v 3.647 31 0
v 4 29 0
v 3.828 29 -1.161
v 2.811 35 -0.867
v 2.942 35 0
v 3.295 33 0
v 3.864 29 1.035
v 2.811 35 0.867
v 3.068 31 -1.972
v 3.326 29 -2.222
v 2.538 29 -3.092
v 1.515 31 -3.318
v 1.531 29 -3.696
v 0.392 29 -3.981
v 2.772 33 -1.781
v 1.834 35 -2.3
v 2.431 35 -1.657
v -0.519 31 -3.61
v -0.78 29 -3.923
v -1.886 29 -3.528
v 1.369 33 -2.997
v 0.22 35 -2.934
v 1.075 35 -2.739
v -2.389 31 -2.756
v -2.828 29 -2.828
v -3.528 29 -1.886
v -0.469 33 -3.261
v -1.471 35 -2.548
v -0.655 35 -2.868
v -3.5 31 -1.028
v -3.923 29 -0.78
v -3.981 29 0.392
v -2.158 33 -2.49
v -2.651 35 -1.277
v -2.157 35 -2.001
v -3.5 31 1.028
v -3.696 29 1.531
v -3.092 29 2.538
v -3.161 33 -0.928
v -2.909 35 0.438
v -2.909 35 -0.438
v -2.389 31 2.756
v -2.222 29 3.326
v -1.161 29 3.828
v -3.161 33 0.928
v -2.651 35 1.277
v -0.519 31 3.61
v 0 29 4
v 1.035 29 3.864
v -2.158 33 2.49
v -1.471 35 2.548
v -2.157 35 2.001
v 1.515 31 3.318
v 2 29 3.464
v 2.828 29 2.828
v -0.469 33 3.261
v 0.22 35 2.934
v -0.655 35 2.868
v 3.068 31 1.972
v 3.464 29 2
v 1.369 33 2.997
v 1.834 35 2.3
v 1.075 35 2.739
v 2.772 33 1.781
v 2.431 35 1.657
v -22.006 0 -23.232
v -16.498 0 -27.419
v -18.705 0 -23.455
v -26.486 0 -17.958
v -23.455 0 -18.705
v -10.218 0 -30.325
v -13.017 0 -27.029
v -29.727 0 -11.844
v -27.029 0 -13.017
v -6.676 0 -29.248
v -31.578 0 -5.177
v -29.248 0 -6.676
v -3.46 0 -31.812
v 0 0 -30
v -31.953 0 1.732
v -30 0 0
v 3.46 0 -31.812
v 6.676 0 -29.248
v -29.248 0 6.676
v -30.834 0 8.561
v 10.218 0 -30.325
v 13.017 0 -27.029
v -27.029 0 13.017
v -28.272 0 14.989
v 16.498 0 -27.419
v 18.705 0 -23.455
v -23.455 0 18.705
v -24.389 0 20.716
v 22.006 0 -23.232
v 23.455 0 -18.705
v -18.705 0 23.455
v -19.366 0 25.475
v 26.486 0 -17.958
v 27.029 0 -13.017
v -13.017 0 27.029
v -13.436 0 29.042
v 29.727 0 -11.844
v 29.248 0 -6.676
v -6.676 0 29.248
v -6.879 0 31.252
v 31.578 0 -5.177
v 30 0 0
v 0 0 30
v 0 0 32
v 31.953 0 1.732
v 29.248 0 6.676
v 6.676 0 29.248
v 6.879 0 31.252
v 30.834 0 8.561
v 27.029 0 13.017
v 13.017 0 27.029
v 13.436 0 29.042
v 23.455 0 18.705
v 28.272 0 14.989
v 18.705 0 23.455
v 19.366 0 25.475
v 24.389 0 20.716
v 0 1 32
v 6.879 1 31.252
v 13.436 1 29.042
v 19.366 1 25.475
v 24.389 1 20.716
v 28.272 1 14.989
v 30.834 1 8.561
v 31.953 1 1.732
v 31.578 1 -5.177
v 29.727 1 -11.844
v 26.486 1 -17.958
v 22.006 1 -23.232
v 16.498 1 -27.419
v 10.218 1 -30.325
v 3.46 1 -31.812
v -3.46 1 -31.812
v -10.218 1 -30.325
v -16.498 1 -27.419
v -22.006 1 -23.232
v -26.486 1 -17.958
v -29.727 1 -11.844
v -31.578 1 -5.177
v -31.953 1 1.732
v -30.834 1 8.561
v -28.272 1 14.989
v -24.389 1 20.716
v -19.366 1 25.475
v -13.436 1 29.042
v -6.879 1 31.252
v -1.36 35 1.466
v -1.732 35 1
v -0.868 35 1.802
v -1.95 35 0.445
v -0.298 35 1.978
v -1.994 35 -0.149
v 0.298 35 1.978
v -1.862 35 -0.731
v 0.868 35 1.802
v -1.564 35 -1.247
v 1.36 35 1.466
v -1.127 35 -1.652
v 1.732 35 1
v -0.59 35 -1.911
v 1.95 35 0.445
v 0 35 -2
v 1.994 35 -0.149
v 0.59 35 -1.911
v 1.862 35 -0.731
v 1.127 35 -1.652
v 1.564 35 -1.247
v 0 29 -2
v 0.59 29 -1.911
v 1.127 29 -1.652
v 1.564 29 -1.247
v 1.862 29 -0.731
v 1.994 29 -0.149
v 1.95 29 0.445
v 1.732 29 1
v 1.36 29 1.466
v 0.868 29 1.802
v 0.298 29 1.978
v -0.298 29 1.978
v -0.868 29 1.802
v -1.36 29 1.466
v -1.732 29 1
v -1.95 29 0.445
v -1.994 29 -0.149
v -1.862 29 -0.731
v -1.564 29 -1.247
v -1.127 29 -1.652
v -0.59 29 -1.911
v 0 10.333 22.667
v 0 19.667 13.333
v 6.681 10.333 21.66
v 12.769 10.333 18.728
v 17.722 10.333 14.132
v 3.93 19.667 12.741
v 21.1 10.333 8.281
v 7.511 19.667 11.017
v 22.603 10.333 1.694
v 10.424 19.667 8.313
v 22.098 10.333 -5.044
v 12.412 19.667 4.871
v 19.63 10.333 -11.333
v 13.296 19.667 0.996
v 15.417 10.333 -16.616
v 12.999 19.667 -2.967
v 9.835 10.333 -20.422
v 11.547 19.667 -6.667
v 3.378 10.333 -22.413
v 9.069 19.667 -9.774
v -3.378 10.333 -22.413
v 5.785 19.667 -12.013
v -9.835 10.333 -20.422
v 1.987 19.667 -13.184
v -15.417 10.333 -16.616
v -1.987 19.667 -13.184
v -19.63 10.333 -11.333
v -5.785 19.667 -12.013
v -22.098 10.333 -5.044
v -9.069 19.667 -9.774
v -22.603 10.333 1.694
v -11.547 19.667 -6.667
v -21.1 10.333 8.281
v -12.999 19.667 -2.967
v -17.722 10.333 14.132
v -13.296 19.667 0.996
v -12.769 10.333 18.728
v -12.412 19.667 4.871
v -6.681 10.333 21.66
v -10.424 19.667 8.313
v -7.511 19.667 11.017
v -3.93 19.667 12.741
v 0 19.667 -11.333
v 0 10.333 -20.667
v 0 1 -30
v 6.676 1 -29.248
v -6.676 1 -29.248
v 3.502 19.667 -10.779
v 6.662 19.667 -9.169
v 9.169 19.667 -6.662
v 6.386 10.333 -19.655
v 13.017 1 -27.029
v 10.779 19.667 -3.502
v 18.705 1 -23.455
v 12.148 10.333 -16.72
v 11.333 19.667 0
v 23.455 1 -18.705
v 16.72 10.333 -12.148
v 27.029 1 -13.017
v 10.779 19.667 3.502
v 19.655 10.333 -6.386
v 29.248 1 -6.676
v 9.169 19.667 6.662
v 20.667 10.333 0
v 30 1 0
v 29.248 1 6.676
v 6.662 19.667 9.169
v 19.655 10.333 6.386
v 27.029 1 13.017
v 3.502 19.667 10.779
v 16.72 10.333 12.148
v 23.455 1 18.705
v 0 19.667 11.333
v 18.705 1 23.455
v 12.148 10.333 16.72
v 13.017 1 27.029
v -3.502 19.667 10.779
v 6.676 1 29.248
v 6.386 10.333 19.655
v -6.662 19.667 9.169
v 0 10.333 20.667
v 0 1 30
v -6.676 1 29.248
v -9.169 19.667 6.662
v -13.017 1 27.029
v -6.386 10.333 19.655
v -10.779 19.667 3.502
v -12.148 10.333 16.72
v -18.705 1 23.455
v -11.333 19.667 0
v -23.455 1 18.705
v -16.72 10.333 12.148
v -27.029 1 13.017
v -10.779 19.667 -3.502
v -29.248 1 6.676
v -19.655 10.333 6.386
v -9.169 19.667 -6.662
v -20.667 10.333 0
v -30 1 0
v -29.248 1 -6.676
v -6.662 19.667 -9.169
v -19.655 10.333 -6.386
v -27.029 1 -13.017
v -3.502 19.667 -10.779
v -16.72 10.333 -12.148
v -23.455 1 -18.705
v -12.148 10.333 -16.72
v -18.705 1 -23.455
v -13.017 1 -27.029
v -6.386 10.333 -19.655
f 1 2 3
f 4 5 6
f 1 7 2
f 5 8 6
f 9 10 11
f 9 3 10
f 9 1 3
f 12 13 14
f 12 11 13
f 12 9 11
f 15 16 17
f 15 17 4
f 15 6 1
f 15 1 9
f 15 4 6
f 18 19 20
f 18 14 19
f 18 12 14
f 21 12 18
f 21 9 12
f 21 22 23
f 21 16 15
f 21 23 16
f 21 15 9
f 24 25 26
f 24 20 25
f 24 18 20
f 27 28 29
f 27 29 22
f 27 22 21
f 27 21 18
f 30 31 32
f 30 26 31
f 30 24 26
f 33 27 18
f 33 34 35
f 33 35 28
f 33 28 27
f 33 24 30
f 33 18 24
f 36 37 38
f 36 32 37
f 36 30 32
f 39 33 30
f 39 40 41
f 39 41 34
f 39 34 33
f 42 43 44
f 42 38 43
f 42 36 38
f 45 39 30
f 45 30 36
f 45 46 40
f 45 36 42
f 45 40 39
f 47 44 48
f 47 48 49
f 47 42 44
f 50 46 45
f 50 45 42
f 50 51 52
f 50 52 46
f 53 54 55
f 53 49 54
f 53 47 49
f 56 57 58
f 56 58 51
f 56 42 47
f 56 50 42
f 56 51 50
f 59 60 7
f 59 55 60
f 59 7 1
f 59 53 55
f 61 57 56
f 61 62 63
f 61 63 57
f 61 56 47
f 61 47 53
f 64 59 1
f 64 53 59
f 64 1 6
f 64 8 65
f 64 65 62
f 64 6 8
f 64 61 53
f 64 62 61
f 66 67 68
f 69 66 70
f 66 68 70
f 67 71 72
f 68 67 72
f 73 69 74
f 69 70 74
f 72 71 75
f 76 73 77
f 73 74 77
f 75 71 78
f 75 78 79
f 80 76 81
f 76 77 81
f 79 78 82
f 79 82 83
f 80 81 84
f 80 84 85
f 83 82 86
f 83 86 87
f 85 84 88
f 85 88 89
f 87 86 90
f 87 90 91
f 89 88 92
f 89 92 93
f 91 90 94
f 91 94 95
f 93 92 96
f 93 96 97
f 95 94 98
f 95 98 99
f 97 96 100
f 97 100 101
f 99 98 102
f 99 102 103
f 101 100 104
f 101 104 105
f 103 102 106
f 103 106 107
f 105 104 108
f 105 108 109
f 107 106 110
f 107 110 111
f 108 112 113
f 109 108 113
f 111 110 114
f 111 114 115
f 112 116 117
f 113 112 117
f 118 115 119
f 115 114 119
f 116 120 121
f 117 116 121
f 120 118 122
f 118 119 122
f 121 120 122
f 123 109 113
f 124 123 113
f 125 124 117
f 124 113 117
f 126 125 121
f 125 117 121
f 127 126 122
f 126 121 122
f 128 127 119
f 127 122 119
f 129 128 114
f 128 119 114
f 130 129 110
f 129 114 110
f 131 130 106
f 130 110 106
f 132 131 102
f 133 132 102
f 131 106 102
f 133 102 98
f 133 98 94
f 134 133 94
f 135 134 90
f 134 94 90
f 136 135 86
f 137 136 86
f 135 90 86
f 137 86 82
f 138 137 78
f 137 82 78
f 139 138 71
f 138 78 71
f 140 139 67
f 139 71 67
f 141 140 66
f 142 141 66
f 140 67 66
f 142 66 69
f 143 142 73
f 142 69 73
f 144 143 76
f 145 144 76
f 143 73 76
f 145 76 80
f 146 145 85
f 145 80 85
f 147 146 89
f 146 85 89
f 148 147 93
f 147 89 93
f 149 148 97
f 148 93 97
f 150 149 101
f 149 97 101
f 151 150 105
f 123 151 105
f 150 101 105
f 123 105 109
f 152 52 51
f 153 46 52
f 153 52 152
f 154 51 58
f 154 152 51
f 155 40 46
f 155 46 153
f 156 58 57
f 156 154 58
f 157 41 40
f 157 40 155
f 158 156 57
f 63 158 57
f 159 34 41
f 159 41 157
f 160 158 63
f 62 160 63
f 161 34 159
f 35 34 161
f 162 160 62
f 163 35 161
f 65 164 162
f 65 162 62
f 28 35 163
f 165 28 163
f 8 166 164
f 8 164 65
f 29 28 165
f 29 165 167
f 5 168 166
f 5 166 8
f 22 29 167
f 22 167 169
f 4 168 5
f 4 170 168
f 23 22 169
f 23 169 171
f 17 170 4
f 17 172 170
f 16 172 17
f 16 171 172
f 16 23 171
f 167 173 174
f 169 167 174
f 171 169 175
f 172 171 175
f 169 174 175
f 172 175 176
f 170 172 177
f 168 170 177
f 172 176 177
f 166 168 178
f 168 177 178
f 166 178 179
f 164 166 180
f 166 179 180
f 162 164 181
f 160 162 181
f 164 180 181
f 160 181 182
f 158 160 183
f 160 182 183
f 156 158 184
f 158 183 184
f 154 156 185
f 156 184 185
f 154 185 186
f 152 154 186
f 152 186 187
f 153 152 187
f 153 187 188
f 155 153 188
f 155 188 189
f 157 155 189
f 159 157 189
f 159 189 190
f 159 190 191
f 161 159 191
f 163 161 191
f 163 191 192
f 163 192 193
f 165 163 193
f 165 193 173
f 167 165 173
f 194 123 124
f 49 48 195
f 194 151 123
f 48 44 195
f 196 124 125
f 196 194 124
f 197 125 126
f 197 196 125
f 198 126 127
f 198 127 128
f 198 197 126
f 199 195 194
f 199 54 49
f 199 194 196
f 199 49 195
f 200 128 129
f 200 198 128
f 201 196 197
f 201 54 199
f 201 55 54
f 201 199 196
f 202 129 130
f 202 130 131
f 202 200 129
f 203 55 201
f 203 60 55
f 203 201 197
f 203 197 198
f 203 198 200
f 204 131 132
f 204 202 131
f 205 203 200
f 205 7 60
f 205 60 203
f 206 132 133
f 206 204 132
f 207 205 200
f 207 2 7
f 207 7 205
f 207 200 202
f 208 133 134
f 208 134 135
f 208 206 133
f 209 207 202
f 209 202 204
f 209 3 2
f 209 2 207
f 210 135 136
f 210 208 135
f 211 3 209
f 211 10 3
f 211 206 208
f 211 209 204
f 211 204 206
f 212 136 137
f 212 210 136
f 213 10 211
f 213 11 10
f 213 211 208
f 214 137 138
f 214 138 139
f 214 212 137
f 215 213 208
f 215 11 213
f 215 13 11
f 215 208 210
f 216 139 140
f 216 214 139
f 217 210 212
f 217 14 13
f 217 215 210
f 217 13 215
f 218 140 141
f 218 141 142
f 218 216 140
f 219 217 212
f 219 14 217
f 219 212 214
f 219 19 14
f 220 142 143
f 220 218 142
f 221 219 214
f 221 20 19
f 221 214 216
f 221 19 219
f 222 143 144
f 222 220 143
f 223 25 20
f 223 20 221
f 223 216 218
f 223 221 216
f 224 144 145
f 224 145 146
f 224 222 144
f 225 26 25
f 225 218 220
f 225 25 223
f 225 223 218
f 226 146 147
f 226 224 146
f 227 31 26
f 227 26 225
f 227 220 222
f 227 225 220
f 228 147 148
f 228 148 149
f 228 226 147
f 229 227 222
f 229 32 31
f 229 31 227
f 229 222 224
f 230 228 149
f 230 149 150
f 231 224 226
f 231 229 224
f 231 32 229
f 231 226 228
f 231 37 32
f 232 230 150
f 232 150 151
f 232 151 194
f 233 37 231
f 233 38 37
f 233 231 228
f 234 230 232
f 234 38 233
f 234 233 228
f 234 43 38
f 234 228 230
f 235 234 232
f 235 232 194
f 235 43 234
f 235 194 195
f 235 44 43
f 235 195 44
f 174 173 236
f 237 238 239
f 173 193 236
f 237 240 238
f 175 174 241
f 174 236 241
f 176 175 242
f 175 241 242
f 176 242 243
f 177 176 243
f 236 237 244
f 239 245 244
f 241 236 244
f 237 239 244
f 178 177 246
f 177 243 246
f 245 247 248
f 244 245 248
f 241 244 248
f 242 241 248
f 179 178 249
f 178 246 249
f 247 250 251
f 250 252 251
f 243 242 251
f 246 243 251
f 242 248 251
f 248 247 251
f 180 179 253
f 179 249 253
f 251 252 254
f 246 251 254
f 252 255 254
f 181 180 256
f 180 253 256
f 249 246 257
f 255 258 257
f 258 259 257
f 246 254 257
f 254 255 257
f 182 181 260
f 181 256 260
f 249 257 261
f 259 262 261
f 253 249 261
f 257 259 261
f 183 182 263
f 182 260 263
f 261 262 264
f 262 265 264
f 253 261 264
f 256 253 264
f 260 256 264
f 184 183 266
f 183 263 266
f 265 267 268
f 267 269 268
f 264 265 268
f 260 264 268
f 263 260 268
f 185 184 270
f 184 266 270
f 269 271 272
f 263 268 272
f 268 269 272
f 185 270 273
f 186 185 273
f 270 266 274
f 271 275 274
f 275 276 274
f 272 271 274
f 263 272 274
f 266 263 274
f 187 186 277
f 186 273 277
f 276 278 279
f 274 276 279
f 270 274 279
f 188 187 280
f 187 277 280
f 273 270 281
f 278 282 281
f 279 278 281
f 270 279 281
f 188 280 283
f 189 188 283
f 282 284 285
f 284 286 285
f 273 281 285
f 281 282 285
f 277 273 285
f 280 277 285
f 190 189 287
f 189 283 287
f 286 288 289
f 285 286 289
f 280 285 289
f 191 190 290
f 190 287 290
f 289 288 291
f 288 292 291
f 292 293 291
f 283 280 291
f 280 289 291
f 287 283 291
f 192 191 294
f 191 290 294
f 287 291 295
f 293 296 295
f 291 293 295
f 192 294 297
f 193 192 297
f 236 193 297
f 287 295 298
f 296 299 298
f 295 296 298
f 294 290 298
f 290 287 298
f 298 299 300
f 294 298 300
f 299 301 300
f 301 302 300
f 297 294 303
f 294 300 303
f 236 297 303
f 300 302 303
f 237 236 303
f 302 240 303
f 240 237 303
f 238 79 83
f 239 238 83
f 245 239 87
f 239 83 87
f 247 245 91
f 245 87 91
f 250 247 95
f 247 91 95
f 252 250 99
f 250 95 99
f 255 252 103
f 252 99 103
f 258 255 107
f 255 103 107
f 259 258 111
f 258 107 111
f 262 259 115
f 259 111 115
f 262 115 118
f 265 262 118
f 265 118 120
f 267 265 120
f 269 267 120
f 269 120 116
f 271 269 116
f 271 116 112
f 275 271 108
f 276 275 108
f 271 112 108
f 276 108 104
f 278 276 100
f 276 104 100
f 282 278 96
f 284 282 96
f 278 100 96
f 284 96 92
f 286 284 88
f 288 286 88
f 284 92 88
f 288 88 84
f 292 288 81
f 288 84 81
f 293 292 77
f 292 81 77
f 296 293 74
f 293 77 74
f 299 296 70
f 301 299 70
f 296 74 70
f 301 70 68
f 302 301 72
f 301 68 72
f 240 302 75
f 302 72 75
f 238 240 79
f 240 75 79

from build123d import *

# Parameters (mm, degrees)
SKETCH_2_R          = 32
EXTRUDE_2_DEPTH     = 1
SKETCH_3_R          = 32
EXTRUDE_3_DEPTH     = 28
EXTRUDE_3_TAPER     = 45
SKETCH_5_R          = 30
CUT_EXTRUDE_1_DEPTH = 1
SKETCH_6_R          = 30
CUT_EXTRUDE_2_DEPTH = 28
CUT_EXTRUDE_2_DRAFT = -45
SKETCH_7_R          = 4
EXTRUDE_5_DEPTH     = 6
EXTRUDE_5_TAPER     = 10
SKETCH_10_R         = 2
CUT_EXTRUDE_3_DEPTH = 54.749418721


with BuildPart() as part:
    # 草图2 → 凸台-拉伸2 (new body)
    with BuildSketch(Plane(origin=(0, 0, 0), x_dir=(1, 0, 0), z_dir=(0, 1, 0))):
        with Locations(Location((0, 0, 0), (0, 0, 270))):
            Circle(SKETCH_2_R)
    extrude(amount=EXTRUDE_2_DEPTH)

    # 草图3 → 凸台-拉伸3 (add)
    with BuildSketch(Plane(origin=(0, 1, 0), x_dir=(1, 0, 0), z_dir=(0, 1, 0))):
        with Locations(Location((0, 0, 0), (0, 0, 270))):
            Circle(SKETCH_3_R)
    extrude(amount=EXTRUDE_3_DEPTH, taper=EXTRUDE_3_TAPER)

    # 草图5 → 切除-拉伸1 (cut)
    with BuildSketch(Plane(origin=(0, 0, 0), x_dir=(-1, 0, 0), z_dir=(0, -1, 0))):
        with Locations(Location((0, 0, 0), (0, 0, 90))):
            Circle(SKETCH_5_R)
    extrude(amount=-CUT_EXTRUDE_1_DEPTH, mode=Mode.SUBTRACT)


with BuildPart() as cut_extrude_2_tool:
    # 草图6 → 切除-拉伸2 (with draft: the straight prism first)
    with BuildSketch(Plane(origin=(0, 1, 0), x_dir=(-1, 0, 0), z_dir=(0, -1, 0))):
        with Locations(Location((0, 0, 0), (0, 0, 90))):
            Circle(SKETCH_6_R)
    extrude(amount=-CUT_EXTRUDE_2_DEPTH)
    # 切除-拉伸2: the draft: its side faces are tilted about the plane it starts from
    cut_extrude_2_sides = [cut_extrude_2_tool.faces().sort_by_distance(p)[0] for p in [
        (0, 15, 30),
    ]]
    draft(cut_extrude_2_sides, Plane(origin=(0, 1, 0), x_dir=(-1, 0, 0), z_dir=(0, -1, 0)), CUT_EXTRUDE_2_DRAFT)


with BuildPart() as part_1:
    add(part.part)

    # 切除-拉伸2: cut by cut_extrude_2_tool
    add(cut_extrude_2_tool.part, mode=Mode.SUBTRACT)

    # 草图7 → 凸台-拉伸5 (add)
    with BuildSketch(Plane(origin=(0, 29, 0), x_dir=(1, 0, 0), z_dir=(0, 1, 0))):
        Circle(SKETCH_7_R)
    extrude(amount=EXTRUDE_5_DEPTH, taper=EXTRUDE_5_TAPER)

    # 草图10 → 切除-拉伸3 (cut, through all)
    with BuildSketch(Plane(origin=(0, 29, 0), x_dir=(-1, 0, 0), z_dir=(0, -1, 0))):
        with Locations(Location((0, 0, 0), (0, 0, 90))):
            Circle(SKETCH_10_R)
    extrude(amount=-CUT_EXTRUDE_3_DEPTH, mode=Mode.SUBTRACT)


solid = part_1.part
